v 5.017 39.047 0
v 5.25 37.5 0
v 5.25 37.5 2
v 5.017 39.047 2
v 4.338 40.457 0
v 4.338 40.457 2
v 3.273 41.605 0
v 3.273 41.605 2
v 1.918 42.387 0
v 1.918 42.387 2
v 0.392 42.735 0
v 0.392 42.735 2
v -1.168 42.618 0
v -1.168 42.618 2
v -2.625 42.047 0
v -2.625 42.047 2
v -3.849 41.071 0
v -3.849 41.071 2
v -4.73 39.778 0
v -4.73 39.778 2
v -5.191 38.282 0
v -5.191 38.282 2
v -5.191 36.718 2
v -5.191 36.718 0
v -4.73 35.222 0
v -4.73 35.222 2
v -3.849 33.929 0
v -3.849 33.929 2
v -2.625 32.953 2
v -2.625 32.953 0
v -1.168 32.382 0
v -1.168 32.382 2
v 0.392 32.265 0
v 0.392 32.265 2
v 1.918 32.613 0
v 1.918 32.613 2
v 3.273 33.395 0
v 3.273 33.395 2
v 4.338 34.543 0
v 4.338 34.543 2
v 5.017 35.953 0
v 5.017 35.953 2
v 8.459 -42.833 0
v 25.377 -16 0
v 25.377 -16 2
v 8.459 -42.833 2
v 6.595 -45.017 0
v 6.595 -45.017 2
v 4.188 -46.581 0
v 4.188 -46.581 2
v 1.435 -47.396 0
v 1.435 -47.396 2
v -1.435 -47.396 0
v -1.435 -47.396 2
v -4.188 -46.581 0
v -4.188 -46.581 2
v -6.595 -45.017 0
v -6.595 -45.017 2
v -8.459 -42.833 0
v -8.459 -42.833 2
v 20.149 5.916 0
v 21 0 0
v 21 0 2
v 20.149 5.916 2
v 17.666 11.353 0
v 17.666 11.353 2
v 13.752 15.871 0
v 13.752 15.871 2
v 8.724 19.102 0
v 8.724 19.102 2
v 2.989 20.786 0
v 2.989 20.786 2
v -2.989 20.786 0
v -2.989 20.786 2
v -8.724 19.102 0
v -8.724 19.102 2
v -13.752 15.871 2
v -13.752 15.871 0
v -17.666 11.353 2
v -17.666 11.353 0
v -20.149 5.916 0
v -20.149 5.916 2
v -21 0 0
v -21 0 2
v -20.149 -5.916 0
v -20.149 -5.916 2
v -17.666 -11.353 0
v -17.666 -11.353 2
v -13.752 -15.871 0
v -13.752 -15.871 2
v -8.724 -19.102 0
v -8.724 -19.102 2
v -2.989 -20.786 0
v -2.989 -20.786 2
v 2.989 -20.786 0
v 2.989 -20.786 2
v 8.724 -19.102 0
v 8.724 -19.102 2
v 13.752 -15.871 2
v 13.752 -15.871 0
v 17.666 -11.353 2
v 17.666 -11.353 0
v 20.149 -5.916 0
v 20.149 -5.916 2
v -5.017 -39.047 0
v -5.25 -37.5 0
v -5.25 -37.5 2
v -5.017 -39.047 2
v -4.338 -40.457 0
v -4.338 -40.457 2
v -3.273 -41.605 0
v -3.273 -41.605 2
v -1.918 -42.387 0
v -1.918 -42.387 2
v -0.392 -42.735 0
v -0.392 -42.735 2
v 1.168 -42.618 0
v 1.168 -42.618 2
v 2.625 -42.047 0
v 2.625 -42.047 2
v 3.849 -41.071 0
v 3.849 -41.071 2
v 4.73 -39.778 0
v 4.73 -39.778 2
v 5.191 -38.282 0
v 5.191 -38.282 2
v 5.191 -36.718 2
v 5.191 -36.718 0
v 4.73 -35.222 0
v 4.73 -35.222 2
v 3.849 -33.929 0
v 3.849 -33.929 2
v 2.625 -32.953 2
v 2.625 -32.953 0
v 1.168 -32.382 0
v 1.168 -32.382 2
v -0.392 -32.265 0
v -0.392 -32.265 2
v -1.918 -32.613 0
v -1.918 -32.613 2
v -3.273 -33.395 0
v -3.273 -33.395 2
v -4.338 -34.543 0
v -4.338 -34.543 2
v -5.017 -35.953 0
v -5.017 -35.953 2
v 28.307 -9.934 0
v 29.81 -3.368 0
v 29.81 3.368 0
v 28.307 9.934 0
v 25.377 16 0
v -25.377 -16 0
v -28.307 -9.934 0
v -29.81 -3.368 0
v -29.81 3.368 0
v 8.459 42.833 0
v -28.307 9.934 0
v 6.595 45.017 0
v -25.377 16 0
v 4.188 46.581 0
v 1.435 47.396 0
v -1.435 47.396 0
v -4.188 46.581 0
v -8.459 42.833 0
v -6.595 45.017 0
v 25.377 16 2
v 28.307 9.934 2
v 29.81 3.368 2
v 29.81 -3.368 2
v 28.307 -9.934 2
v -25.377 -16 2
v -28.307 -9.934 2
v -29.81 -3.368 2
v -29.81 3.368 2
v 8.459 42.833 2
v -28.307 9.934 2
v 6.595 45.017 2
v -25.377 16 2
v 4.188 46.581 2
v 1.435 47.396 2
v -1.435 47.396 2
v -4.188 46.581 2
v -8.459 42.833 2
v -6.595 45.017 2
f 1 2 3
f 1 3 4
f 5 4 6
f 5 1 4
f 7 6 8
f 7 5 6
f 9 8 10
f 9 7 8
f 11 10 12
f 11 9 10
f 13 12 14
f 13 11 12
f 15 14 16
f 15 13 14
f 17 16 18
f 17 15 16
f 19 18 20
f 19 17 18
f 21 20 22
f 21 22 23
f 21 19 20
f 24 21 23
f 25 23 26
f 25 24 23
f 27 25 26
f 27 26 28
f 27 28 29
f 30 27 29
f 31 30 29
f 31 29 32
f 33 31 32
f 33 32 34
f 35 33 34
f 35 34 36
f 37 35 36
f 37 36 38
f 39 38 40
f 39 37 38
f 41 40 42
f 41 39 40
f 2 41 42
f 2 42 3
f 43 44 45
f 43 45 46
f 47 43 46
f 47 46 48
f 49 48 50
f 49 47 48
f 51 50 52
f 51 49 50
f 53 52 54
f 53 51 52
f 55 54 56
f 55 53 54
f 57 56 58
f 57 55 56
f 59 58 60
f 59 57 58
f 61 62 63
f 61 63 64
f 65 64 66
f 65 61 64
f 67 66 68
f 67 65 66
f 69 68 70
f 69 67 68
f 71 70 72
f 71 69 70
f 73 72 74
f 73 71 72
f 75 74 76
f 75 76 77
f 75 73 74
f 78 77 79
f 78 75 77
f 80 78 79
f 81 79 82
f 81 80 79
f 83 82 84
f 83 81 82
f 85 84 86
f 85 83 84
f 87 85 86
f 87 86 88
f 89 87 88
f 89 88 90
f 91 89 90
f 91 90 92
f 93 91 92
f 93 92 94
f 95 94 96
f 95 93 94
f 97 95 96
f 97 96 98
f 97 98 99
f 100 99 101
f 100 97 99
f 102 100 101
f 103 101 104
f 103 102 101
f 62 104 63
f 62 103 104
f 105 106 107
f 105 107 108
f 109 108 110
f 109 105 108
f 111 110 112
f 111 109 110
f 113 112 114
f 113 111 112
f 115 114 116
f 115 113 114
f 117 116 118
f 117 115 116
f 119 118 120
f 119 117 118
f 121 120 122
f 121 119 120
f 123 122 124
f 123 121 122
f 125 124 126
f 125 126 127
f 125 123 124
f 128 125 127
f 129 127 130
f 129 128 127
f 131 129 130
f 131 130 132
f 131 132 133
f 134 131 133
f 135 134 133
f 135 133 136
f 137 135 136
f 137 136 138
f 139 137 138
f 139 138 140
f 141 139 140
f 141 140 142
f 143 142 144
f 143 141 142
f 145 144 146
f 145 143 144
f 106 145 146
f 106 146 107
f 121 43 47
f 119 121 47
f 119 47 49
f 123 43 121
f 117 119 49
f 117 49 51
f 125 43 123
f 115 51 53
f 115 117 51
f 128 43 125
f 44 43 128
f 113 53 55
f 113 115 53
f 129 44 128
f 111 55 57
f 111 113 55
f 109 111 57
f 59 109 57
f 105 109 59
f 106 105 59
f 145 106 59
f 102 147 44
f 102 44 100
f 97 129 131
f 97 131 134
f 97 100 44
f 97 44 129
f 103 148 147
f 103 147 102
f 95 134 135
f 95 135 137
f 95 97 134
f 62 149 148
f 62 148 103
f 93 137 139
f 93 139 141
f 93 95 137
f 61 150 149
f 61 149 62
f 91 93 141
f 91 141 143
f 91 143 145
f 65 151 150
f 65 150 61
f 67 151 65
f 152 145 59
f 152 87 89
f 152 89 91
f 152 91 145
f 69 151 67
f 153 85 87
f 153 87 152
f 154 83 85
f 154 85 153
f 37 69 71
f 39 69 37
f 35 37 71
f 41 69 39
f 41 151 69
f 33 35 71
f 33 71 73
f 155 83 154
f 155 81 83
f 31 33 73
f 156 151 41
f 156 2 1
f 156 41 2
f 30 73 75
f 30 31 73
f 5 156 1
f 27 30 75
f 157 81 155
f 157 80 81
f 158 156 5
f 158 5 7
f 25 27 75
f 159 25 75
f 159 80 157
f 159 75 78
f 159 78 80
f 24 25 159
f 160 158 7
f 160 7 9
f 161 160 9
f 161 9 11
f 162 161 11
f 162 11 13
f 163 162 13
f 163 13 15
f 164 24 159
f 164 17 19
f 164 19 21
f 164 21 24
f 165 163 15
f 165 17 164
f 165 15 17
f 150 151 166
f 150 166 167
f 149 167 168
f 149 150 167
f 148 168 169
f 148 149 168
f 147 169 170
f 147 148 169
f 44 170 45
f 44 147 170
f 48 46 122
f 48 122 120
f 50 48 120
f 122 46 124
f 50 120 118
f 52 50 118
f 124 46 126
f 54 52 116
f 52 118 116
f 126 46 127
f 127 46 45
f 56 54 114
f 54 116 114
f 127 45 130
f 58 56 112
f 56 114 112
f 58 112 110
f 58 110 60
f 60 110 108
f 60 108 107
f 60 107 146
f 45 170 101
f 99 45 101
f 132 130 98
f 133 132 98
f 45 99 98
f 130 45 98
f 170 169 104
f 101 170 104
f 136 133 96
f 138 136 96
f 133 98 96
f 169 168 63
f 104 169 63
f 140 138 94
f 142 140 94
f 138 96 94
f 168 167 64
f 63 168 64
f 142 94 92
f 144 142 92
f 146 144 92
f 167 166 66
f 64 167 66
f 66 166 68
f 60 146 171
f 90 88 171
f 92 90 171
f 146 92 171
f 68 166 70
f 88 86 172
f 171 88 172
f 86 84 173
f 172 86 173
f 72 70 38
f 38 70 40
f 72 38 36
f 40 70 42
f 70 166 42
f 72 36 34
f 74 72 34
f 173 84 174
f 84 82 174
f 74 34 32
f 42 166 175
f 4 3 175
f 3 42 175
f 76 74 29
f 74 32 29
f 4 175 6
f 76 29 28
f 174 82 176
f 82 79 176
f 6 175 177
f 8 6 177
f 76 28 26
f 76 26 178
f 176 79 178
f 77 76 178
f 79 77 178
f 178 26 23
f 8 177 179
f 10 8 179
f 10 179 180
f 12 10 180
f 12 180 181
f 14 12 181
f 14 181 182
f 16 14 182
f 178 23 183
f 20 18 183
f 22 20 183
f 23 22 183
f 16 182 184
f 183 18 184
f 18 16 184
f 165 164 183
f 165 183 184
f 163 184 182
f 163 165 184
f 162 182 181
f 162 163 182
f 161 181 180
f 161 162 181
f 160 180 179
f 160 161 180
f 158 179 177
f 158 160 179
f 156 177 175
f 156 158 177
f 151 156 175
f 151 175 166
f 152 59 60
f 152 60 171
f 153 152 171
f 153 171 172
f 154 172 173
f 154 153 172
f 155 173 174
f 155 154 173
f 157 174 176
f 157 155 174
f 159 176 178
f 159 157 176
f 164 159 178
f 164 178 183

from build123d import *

# Parameters (mm, degrees)
SKETCH3_R           = 5.25
SKETCH3_R_2         = 21
BOSS_EXTRUDE1_DEPTH = 2


with BuildPart() as part:
    # Sketch3 → Boss-Extrude1 (new body)
    with BuildSketch(Plane.XY):
        with BuildLine():
            Line((8.459051694, 42.833333333), (25.377155081, 16))
            ThreePointArc((25.377155081, 16), (30, 0), (25.377155081, -16))
            Line((25.377155081, -16), (8.459051694, -42.833333333))
            ThreePointArc((8.459051694, -42.833333333), (0, -47.5), (-8.459051694, -42.833333333))
            Line((-8.459051694, -42.833333333), (-25.377155081, -16))
            ThreePointArc((-25.377155081, -16), (-30, 0), (-25.377155081, 16))
            Line((-25.377155081, 16), (-8.459051694, 42.833333333))
            ThreePointArc((-8.459051694, 42.833333333), (0, 47.5), (8.459051694, 42.833333333))
        make_face()
        with Locations((0, 37.5)):
            Circle(SKETCH3_R, mode=Mode.SUBTRACT)
        Circle(SKETCH3_R_2, mode=Mode.SUBTRACT)
        with Locations(Location((0, -37.5, 0), (0, 0, 180))):
            Circle(SKETCH3_R, mode=Mode.SUBTRACT)
    extrude(amount=BOSS_EXTRUDE1_DEPTH)


solid = part.part
